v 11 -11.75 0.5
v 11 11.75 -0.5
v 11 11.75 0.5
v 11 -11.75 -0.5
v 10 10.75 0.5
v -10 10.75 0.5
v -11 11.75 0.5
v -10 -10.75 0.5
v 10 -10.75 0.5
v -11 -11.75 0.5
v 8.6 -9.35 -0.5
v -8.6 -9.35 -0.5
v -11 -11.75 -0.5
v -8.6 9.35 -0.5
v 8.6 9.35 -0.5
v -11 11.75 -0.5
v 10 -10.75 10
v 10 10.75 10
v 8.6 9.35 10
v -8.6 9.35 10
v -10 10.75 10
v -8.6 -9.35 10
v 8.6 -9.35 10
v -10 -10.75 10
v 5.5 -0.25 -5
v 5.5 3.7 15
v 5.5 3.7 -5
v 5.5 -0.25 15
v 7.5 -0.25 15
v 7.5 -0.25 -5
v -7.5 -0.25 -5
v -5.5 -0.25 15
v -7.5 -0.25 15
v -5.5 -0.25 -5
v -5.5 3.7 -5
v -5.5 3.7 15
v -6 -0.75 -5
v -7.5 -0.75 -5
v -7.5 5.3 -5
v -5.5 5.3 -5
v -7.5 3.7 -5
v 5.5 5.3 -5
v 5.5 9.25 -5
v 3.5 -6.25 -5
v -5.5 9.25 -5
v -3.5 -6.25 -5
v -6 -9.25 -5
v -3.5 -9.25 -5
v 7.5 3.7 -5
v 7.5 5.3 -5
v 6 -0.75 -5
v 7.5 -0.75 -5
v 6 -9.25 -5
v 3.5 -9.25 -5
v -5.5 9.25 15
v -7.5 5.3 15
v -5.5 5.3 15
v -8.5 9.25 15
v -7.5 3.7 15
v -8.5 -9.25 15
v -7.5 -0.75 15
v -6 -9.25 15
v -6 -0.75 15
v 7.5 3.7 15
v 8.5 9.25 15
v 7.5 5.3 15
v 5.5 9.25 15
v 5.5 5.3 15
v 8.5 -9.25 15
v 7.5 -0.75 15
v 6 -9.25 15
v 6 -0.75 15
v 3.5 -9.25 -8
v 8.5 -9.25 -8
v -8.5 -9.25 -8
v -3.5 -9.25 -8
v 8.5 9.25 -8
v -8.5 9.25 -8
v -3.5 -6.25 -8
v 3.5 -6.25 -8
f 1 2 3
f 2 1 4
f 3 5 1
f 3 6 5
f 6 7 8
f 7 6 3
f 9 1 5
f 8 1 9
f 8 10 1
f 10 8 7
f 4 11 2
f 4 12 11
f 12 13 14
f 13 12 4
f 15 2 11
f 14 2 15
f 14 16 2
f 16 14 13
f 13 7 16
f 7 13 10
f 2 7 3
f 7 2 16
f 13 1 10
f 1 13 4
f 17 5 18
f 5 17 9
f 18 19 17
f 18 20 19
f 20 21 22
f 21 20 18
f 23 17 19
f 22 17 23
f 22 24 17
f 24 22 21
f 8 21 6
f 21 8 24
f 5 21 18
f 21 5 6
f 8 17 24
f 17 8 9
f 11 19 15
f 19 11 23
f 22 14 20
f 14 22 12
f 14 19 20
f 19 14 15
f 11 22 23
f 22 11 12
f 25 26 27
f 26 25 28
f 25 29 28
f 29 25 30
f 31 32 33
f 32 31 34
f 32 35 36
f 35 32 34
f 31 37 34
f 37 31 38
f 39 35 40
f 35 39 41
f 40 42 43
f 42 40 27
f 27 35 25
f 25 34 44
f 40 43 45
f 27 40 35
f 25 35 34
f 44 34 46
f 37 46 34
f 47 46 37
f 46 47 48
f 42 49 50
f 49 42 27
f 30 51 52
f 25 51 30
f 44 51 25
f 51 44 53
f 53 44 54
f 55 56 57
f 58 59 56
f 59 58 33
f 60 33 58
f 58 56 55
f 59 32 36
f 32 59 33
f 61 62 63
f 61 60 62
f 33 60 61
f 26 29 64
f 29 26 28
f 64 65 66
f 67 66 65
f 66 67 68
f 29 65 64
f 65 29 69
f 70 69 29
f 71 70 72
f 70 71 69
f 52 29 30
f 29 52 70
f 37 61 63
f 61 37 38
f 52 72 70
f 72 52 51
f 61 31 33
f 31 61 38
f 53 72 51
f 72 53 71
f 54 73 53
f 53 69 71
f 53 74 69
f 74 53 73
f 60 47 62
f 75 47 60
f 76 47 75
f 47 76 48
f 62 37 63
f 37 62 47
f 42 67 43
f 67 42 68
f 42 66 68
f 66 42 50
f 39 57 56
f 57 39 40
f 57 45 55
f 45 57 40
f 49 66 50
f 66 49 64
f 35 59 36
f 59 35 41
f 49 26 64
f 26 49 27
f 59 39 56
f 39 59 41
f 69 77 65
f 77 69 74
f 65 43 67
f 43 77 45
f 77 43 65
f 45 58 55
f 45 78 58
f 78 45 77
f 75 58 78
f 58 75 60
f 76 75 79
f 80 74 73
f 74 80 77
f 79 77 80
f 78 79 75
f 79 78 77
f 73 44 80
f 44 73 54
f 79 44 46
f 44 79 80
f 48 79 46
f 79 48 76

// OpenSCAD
module driverPcb(depth = 40) {

    componentsWidth = 11;
    componentsDepth = depth;
    componentsHeight = 4;
    pcbWidth = 15;
    pcbDepth = depth;
    pcbHeight = 1.6;
    backWidth = 11;
    backDepth = depth;
    backHeight = 2;
    
    translate([0, 0, (componentsHeight + pcbHeight) / 2]) cube([componentsWidth, componentsDepth, componentsHeight], center = true);
    cube([pcbWidth, pcbDepth, pcbHeight], center = true);
    translate([0, 0, -(backHeight + pcbHeight) / 2]) cube([backWidth, backDepth, backHeight], center = true);

}

module servo(depth = 40) {

    backWidth = 11;
    backDepth = depth;
    backHeight = 2.5;
    pcbWidth = 15;
    pcbDepth = depth;
    pcbHeight = 0.5;
    servoWidth = 12;
    servoDepth = depth;
    servoHeight = 8.5;
    
    translate([0, 0, (backHeight + pcbHeight) / 2]) cube([backWidth, backDepth, backHeight], center = true);
    cube([pcbWidth, pcbDepth, pcbHeight], center = true);
    translate([0, 0, -(servoHeight + pcbHeight) / 2]) cube([servoWidth, servoDepth, servoHeight], center = true);

}




module rodHole(baseThickness = 3) {
    cube([7, baseThickness, 3], center=true);
}


module mount(mountWidth, mountHeight) {

    mountTop = 3;
    mountDepth = 20 + mountTop;

    difference() {
        translate([0, -(mountDepth / 2) + mountTop, 0]) cube([mountWidth, mountDepth, mountHeight], center = true);
        translate([0, mountTop / 2, -(mountHeight / 2) + 1.5]) rodHole(mountTop);
        translate([0, -(mountDepth - mountTop) / 2, 0]) 
        union() {
            translate([0, 0, -0.5]) servo(20);
            translate([0, 0, 4.5]) driverPcb(20);
        }
    }
    
}

module mountSocket(mountWidth, mountHeight) {
    difference() {
        union() {
            cube([mountWidth + 5, mountHeight+ 5, 1], center=true);
            translate([0, 0, 5]) cube([mountWidth + 3, mountHeight + 3, 10], center=true);
        }
        translate([0, 0, 5]) cube([mountWidth + 0.2, mountHeight + 0.2, 15], center=true);
    }
}

mountWidth = 17;
mountHeight = 18.5;


mountSocket(mountWidth, mountHeight);


translate([0, 0, -5]) rotate([-90, 0, 0]) mount(mountWidth, mountHeight);
